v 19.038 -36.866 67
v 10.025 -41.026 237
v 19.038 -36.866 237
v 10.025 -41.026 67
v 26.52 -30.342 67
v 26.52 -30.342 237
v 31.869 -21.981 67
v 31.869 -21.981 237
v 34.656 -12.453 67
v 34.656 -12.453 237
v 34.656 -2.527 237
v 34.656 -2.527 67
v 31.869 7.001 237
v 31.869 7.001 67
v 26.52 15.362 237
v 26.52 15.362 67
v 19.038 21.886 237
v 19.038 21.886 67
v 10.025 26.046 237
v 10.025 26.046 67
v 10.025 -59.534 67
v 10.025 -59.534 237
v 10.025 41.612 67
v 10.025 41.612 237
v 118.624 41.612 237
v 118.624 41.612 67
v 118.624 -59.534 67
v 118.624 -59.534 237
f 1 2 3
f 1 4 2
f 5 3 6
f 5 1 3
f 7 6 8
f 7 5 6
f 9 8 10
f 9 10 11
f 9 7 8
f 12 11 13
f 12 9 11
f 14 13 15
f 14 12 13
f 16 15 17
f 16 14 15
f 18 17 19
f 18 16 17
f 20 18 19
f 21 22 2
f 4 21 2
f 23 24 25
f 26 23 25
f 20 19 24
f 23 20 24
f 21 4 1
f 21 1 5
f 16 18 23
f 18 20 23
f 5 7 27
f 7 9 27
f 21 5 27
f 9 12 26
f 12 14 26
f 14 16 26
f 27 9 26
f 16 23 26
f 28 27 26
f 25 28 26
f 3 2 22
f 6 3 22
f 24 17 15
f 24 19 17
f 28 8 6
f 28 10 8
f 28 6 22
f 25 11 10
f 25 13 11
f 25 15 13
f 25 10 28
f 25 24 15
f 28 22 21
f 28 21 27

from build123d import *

# Parameters (mm, degrees)
SKETCH017_W          = 108.598946
SKETCH017_H          = 101.145454
PAD007_DEPTH         = 170
SKETCH018_R          = 35
POCKET011_DEPTH      = 0.001
POCKET012_DEPTH      = 0.001
POCKET012_DEPTH_BACK = 170.001


with BuildPart() as part:
    # Sketch017 → Pad007 (new body)
    with BuildSketch(Plane.XY):
        with Locations((64.32481, -8.960884)):
            Rectangle(SKETCH017_W, SKETCH017_H)
    extrude(amount=PAD007_DEPTH)

    # Sketch018 → Pocket011 (cut, through all)
    with BuildSketch(Plane.XY):
        with Locations((0.01, -7.49)):
            Circle(SKETCH018_R)
    extrude(amount=-POCKET011_DEPTH, mode=Mode.SUBTRACT)

    # Sketch018 → Pocket012 (cut, two sides)
    with BuildSketch(Plane.XY) as pocket012_sk:
        with Locations((0.01, -7.49)):
            Circle(SKETCH018_R)
    extrude(amount=-POCKET012_DEPTH, mode=Mode.SUBTRACT)
    extrude(pocket012_sk.sketch, amount=POCKET012_DEPTH_BACK, mode=Mode.SUBTRACT)


with BuildPart() as part_1:
    # Body005 placement: moved
    add(part.part.moved(Location((0, 0, 67))))


solid = part_1.part
